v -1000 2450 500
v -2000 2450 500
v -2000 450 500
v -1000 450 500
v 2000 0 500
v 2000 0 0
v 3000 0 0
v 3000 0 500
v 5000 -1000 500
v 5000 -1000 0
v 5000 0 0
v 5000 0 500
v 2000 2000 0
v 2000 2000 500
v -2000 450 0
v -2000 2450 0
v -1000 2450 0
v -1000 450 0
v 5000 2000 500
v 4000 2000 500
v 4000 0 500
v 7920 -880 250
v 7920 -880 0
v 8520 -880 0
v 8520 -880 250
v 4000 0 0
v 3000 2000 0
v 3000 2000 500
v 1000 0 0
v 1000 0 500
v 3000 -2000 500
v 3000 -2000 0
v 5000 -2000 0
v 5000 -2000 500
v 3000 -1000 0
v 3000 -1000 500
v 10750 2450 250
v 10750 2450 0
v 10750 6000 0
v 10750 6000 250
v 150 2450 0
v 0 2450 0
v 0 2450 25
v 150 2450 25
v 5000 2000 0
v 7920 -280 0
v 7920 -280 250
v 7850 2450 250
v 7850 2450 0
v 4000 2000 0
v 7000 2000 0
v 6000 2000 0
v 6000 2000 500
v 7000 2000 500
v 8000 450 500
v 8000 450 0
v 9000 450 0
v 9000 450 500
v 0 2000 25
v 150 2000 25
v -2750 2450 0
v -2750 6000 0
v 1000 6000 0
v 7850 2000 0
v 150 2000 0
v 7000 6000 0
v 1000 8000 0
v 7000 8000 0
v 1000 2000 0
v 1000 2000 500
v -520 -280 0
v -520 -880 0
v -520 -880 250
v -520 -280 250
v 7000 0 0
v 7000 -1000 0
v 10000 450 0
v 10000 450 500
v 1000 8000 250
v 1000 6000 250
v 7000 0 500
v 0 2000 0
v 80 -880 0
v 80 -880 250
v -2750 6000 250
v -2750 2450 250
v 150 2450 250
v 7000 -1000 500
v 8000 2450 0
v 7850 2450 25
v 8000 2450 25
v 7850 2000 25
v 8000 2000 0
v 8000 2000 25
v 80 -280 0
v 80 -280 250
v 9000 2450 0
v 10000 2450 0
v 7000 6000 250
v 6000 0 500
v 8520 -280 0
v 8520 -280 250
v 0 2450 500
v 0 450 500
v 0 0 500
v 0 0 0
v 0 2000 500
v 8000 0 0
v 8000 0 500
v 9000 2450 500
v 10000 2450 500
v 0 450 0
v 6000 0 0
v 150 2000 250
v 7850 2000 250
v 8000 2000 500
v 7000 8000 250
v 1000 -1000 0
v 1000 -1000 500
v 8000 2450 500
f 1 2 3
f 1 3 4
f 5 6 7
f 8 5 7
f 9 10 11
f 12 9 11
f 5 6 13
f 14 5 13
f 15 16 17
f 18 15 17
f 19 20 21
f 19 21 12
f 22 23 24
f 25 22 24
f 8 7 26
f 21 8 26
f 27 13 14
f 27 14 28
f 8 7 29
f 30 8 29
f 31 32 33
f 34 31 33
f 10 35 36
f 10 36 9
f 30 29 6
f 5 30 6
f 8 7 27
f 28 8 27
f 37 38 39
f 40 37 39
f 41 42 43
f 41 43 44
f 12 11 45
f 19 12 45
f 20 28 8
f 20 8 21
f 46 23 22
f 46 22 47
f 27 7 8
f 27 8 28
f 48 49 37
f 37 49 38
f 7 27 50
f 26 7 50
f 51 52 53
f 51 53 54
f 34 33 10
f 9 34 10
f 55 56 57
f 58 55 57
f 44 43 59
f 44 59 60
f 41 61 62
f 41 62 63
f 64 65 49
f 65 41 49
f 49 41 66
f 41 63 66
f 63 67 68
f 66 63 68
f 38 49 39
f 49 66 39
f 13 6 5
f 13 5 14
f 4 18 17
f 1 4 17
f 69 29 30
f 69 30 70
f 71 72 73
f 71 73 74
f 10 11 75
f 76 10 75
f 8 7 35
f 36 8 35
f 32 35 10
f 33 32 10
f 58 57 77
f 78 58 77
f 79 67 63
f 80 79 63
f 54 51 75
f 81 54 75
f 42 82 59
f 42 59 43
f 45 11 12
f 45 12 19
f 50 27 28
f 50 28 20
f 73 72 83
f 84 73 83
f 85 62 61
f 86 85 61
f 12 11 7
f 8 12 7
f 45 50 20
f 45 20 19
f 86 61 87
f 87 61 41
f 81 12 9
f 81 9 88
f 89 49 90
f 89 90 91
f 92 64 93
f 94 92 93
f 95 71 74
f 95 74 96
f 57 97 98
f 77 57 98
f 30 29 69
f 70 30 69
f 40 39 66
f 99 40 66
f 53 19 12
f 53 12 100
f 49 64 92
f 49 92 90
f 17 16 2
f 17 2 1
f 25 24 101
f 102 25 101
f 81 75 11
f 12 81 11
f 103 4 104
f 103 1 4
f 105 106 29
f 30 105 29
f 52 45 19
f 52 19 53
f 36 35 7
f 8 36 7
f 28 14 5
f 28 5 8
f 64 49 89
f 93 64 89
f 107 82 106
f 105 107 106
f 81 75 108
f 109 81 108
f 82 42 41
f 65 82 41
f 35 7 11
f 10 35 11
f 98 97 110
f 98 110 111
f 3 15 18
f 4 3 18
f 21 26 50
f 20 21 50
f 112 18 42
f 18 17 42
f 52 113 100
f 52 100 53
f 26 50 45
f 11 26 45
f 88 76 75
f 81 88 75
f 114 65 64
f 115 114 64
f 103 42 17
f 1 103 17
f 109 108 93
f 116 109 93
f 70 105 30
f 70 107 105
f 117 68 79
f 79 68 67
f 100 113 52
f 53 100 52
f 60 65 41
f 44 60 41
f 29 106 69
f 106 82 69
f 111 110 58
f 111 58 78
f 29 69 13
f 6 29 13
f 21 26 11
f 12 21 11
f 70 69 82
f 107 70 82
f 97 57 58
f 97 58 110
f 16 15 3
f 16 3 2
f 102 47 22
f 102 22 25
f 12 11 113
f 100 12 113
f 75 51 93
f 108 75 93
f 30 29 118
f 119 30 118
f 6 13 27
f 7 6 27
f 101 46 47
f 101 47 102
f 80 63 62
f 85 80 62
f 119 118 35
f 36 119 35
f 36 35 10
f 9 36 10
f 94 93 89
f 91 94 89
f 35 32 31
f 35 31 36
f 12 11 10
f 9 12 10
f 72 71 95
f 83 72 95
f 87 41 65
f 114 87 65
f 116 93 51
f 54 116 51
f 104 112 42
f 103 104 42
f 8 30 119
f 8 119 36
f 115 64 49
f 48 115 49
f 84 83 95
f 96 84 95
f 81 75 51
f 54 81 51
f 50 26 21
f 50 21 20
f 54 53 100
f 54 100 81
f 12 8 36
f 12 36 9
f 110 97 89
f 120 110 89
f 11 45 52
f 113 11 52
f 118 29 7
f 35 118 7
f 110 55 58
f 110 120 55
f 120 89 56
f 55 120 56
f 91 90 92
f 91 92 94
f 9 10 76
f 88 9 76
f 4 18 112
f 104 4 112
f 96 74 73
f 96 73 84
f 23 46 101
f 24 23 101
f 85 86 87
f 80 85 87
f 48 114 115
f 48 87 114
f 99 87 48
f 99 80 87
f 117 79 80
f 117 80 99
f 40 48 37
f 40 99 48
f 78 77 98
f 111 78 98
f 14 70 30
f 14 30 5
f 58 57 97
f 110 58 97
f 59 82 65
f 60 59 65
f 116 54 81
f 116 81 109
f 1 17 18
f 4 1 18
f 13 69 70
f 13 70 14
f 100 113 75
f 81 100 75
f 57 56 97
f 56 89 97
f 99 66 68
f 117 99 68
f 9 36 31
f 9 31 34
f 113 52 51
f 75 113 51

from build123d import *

# Parameters (mm, degrees)
F0_W     = 1000
F0_H     = 2000
F1_DEPTH = 500
F2_DEPTH = 500
F3_DEPTH = 500
F0_W_2   = 2000
F0_H_2   = 1000
F4_DEPTH = 500
F0_W_3   = 150
F0_H_3   = 450
F5_DEPTH = 25
F6_DEPTH = 500
F0_W_4   = 600
F0_H_4   = 600
F7_DEPTH = 250


with BuildPart() as f1:
    # F0 (on Top) → F1 (new body)
    with BuildSketch(Plane.XY):
        with Locations((-1500, 1450)):
            Rectangle(F0_W, F0_H)
    extrude(amount=F1_DEPTH)


with BuildPart() as f2:
    # F0 (on Top) → F2 (new body)
    with BuildSketch(Plane.XY):
        Polygon((0, 450), (0, 0), (1000, 0), (1000, 2000), (150, 2000), (0, 2000), align=None)
        with Locations((2500, 1000)):
            Rectangle(F0_W, F0_H)
        with Locations((4500, 1000)):
            Rectangle(F0_W, F0_H)
        with Locations((6500, 1000)):
            Rectangle(F0_W, F0_H)
        Polygon((8000, 2000), (8000, 450), (9000, 450), (9000, 2450), (8000, 2450), align=None)
    extrude(amount=F2_DEPTH)


with BuildPart() as f3:
    # F0 (on Top) → F3 (new body)
    with BuildSketch(Plane.XY):
        Polygon((-1000, 450), (0, 450), (0, 2000), (0, 2450), (-1000, 2450), align=None)
        with Locations((1500, 1000)):
            Rectangle(F0_W, F0_H)
        with Locations((3500, 1000)):
            Rectangle(F0_W, F0_H)
        with Locations((5500, 1000)):
            Rectangle(F0_W, F0_H)
        Polygon((7000, 2000), (7000, 0), (8000, 0), (8000, 450), (8000, 2000), (7850, 2000), align=None)
        with Locations((9500, 1450)):
            Rectangle(F0_W, F0_H)
    extrude(amount=F3_DEPTH)


with BuildPart() as f4:
    # F0 (on Top) → F4 (new body)
    with BuildSketch(Plane.XY):
        Polygon((2000, 0), (1000, 0), (1000, -1000), (3000, -1000), (3000, 0), align=None)
        with Locations((4000, -1500)):
            Rectangle(F0_W_2, F0_H_2)
        Polygon((5000, 0), (5000, -1000), (7000, -1000), (7000, 0), (6000, 0), align=None)
    extrude(amount=F4_DEPTH)


with BuildPart() as f5:
    # F0 (on Top) → F5 (new body)
    with BuildSketch(Plane.XY):
        with Locations((75, 2225)):
            Rectangle(F0_W_3, F0_H_3)
        with Locations((7925, 2225)):
            Rectangle(F0_W_3, F0_H_3)
    extrude(amount=F5_DEPTH)


with BuildPart() as f6:
    # F0 (on Top) → F6 (new body)
    with BuildSketch(Plane.XY):
        Polygon((4000, 0), (3000, 0), (3000, -1000), (5000, -1000), (5000, 0), align=None)
    extrude(amount=F6_DEPTH)


with BuildPart() as f7:
    # F0 (on Top) → F7 (new body)
    with BuildSketch(Plane.XY):
        Polygon((150, 2000), (1000, 2000), (2000, 2000), (3000, 2000), (4000, 2000), (5000, 2000), (6000, 2000), (7000, 2000), (7850, 2000), (7850, 2450), (8000, 2450), (9000, 2450), (10000, 2450), (10750, 2450), (10750, 6000), (7000, 6000), (7000, 8000), (1000, 8000), (1000, 6000), (-2750, 6000), (-2750, 2450), (-2000, 2450), (-1000, 2450), (0, 2450), (150, 2450), align=None)
        with Locations((-220, -580)):
            Rectangle(F0_W_4, F0_H_4)
        with Locations((8220, -580)):
            Rectangle(F0_W_4, F0_H_4)
    extrude(amount=F7_DEPTH)


solid = Compound([f1.part, f2.part, f3.part, f4.part, f5.part, f6.part, f7.part])
